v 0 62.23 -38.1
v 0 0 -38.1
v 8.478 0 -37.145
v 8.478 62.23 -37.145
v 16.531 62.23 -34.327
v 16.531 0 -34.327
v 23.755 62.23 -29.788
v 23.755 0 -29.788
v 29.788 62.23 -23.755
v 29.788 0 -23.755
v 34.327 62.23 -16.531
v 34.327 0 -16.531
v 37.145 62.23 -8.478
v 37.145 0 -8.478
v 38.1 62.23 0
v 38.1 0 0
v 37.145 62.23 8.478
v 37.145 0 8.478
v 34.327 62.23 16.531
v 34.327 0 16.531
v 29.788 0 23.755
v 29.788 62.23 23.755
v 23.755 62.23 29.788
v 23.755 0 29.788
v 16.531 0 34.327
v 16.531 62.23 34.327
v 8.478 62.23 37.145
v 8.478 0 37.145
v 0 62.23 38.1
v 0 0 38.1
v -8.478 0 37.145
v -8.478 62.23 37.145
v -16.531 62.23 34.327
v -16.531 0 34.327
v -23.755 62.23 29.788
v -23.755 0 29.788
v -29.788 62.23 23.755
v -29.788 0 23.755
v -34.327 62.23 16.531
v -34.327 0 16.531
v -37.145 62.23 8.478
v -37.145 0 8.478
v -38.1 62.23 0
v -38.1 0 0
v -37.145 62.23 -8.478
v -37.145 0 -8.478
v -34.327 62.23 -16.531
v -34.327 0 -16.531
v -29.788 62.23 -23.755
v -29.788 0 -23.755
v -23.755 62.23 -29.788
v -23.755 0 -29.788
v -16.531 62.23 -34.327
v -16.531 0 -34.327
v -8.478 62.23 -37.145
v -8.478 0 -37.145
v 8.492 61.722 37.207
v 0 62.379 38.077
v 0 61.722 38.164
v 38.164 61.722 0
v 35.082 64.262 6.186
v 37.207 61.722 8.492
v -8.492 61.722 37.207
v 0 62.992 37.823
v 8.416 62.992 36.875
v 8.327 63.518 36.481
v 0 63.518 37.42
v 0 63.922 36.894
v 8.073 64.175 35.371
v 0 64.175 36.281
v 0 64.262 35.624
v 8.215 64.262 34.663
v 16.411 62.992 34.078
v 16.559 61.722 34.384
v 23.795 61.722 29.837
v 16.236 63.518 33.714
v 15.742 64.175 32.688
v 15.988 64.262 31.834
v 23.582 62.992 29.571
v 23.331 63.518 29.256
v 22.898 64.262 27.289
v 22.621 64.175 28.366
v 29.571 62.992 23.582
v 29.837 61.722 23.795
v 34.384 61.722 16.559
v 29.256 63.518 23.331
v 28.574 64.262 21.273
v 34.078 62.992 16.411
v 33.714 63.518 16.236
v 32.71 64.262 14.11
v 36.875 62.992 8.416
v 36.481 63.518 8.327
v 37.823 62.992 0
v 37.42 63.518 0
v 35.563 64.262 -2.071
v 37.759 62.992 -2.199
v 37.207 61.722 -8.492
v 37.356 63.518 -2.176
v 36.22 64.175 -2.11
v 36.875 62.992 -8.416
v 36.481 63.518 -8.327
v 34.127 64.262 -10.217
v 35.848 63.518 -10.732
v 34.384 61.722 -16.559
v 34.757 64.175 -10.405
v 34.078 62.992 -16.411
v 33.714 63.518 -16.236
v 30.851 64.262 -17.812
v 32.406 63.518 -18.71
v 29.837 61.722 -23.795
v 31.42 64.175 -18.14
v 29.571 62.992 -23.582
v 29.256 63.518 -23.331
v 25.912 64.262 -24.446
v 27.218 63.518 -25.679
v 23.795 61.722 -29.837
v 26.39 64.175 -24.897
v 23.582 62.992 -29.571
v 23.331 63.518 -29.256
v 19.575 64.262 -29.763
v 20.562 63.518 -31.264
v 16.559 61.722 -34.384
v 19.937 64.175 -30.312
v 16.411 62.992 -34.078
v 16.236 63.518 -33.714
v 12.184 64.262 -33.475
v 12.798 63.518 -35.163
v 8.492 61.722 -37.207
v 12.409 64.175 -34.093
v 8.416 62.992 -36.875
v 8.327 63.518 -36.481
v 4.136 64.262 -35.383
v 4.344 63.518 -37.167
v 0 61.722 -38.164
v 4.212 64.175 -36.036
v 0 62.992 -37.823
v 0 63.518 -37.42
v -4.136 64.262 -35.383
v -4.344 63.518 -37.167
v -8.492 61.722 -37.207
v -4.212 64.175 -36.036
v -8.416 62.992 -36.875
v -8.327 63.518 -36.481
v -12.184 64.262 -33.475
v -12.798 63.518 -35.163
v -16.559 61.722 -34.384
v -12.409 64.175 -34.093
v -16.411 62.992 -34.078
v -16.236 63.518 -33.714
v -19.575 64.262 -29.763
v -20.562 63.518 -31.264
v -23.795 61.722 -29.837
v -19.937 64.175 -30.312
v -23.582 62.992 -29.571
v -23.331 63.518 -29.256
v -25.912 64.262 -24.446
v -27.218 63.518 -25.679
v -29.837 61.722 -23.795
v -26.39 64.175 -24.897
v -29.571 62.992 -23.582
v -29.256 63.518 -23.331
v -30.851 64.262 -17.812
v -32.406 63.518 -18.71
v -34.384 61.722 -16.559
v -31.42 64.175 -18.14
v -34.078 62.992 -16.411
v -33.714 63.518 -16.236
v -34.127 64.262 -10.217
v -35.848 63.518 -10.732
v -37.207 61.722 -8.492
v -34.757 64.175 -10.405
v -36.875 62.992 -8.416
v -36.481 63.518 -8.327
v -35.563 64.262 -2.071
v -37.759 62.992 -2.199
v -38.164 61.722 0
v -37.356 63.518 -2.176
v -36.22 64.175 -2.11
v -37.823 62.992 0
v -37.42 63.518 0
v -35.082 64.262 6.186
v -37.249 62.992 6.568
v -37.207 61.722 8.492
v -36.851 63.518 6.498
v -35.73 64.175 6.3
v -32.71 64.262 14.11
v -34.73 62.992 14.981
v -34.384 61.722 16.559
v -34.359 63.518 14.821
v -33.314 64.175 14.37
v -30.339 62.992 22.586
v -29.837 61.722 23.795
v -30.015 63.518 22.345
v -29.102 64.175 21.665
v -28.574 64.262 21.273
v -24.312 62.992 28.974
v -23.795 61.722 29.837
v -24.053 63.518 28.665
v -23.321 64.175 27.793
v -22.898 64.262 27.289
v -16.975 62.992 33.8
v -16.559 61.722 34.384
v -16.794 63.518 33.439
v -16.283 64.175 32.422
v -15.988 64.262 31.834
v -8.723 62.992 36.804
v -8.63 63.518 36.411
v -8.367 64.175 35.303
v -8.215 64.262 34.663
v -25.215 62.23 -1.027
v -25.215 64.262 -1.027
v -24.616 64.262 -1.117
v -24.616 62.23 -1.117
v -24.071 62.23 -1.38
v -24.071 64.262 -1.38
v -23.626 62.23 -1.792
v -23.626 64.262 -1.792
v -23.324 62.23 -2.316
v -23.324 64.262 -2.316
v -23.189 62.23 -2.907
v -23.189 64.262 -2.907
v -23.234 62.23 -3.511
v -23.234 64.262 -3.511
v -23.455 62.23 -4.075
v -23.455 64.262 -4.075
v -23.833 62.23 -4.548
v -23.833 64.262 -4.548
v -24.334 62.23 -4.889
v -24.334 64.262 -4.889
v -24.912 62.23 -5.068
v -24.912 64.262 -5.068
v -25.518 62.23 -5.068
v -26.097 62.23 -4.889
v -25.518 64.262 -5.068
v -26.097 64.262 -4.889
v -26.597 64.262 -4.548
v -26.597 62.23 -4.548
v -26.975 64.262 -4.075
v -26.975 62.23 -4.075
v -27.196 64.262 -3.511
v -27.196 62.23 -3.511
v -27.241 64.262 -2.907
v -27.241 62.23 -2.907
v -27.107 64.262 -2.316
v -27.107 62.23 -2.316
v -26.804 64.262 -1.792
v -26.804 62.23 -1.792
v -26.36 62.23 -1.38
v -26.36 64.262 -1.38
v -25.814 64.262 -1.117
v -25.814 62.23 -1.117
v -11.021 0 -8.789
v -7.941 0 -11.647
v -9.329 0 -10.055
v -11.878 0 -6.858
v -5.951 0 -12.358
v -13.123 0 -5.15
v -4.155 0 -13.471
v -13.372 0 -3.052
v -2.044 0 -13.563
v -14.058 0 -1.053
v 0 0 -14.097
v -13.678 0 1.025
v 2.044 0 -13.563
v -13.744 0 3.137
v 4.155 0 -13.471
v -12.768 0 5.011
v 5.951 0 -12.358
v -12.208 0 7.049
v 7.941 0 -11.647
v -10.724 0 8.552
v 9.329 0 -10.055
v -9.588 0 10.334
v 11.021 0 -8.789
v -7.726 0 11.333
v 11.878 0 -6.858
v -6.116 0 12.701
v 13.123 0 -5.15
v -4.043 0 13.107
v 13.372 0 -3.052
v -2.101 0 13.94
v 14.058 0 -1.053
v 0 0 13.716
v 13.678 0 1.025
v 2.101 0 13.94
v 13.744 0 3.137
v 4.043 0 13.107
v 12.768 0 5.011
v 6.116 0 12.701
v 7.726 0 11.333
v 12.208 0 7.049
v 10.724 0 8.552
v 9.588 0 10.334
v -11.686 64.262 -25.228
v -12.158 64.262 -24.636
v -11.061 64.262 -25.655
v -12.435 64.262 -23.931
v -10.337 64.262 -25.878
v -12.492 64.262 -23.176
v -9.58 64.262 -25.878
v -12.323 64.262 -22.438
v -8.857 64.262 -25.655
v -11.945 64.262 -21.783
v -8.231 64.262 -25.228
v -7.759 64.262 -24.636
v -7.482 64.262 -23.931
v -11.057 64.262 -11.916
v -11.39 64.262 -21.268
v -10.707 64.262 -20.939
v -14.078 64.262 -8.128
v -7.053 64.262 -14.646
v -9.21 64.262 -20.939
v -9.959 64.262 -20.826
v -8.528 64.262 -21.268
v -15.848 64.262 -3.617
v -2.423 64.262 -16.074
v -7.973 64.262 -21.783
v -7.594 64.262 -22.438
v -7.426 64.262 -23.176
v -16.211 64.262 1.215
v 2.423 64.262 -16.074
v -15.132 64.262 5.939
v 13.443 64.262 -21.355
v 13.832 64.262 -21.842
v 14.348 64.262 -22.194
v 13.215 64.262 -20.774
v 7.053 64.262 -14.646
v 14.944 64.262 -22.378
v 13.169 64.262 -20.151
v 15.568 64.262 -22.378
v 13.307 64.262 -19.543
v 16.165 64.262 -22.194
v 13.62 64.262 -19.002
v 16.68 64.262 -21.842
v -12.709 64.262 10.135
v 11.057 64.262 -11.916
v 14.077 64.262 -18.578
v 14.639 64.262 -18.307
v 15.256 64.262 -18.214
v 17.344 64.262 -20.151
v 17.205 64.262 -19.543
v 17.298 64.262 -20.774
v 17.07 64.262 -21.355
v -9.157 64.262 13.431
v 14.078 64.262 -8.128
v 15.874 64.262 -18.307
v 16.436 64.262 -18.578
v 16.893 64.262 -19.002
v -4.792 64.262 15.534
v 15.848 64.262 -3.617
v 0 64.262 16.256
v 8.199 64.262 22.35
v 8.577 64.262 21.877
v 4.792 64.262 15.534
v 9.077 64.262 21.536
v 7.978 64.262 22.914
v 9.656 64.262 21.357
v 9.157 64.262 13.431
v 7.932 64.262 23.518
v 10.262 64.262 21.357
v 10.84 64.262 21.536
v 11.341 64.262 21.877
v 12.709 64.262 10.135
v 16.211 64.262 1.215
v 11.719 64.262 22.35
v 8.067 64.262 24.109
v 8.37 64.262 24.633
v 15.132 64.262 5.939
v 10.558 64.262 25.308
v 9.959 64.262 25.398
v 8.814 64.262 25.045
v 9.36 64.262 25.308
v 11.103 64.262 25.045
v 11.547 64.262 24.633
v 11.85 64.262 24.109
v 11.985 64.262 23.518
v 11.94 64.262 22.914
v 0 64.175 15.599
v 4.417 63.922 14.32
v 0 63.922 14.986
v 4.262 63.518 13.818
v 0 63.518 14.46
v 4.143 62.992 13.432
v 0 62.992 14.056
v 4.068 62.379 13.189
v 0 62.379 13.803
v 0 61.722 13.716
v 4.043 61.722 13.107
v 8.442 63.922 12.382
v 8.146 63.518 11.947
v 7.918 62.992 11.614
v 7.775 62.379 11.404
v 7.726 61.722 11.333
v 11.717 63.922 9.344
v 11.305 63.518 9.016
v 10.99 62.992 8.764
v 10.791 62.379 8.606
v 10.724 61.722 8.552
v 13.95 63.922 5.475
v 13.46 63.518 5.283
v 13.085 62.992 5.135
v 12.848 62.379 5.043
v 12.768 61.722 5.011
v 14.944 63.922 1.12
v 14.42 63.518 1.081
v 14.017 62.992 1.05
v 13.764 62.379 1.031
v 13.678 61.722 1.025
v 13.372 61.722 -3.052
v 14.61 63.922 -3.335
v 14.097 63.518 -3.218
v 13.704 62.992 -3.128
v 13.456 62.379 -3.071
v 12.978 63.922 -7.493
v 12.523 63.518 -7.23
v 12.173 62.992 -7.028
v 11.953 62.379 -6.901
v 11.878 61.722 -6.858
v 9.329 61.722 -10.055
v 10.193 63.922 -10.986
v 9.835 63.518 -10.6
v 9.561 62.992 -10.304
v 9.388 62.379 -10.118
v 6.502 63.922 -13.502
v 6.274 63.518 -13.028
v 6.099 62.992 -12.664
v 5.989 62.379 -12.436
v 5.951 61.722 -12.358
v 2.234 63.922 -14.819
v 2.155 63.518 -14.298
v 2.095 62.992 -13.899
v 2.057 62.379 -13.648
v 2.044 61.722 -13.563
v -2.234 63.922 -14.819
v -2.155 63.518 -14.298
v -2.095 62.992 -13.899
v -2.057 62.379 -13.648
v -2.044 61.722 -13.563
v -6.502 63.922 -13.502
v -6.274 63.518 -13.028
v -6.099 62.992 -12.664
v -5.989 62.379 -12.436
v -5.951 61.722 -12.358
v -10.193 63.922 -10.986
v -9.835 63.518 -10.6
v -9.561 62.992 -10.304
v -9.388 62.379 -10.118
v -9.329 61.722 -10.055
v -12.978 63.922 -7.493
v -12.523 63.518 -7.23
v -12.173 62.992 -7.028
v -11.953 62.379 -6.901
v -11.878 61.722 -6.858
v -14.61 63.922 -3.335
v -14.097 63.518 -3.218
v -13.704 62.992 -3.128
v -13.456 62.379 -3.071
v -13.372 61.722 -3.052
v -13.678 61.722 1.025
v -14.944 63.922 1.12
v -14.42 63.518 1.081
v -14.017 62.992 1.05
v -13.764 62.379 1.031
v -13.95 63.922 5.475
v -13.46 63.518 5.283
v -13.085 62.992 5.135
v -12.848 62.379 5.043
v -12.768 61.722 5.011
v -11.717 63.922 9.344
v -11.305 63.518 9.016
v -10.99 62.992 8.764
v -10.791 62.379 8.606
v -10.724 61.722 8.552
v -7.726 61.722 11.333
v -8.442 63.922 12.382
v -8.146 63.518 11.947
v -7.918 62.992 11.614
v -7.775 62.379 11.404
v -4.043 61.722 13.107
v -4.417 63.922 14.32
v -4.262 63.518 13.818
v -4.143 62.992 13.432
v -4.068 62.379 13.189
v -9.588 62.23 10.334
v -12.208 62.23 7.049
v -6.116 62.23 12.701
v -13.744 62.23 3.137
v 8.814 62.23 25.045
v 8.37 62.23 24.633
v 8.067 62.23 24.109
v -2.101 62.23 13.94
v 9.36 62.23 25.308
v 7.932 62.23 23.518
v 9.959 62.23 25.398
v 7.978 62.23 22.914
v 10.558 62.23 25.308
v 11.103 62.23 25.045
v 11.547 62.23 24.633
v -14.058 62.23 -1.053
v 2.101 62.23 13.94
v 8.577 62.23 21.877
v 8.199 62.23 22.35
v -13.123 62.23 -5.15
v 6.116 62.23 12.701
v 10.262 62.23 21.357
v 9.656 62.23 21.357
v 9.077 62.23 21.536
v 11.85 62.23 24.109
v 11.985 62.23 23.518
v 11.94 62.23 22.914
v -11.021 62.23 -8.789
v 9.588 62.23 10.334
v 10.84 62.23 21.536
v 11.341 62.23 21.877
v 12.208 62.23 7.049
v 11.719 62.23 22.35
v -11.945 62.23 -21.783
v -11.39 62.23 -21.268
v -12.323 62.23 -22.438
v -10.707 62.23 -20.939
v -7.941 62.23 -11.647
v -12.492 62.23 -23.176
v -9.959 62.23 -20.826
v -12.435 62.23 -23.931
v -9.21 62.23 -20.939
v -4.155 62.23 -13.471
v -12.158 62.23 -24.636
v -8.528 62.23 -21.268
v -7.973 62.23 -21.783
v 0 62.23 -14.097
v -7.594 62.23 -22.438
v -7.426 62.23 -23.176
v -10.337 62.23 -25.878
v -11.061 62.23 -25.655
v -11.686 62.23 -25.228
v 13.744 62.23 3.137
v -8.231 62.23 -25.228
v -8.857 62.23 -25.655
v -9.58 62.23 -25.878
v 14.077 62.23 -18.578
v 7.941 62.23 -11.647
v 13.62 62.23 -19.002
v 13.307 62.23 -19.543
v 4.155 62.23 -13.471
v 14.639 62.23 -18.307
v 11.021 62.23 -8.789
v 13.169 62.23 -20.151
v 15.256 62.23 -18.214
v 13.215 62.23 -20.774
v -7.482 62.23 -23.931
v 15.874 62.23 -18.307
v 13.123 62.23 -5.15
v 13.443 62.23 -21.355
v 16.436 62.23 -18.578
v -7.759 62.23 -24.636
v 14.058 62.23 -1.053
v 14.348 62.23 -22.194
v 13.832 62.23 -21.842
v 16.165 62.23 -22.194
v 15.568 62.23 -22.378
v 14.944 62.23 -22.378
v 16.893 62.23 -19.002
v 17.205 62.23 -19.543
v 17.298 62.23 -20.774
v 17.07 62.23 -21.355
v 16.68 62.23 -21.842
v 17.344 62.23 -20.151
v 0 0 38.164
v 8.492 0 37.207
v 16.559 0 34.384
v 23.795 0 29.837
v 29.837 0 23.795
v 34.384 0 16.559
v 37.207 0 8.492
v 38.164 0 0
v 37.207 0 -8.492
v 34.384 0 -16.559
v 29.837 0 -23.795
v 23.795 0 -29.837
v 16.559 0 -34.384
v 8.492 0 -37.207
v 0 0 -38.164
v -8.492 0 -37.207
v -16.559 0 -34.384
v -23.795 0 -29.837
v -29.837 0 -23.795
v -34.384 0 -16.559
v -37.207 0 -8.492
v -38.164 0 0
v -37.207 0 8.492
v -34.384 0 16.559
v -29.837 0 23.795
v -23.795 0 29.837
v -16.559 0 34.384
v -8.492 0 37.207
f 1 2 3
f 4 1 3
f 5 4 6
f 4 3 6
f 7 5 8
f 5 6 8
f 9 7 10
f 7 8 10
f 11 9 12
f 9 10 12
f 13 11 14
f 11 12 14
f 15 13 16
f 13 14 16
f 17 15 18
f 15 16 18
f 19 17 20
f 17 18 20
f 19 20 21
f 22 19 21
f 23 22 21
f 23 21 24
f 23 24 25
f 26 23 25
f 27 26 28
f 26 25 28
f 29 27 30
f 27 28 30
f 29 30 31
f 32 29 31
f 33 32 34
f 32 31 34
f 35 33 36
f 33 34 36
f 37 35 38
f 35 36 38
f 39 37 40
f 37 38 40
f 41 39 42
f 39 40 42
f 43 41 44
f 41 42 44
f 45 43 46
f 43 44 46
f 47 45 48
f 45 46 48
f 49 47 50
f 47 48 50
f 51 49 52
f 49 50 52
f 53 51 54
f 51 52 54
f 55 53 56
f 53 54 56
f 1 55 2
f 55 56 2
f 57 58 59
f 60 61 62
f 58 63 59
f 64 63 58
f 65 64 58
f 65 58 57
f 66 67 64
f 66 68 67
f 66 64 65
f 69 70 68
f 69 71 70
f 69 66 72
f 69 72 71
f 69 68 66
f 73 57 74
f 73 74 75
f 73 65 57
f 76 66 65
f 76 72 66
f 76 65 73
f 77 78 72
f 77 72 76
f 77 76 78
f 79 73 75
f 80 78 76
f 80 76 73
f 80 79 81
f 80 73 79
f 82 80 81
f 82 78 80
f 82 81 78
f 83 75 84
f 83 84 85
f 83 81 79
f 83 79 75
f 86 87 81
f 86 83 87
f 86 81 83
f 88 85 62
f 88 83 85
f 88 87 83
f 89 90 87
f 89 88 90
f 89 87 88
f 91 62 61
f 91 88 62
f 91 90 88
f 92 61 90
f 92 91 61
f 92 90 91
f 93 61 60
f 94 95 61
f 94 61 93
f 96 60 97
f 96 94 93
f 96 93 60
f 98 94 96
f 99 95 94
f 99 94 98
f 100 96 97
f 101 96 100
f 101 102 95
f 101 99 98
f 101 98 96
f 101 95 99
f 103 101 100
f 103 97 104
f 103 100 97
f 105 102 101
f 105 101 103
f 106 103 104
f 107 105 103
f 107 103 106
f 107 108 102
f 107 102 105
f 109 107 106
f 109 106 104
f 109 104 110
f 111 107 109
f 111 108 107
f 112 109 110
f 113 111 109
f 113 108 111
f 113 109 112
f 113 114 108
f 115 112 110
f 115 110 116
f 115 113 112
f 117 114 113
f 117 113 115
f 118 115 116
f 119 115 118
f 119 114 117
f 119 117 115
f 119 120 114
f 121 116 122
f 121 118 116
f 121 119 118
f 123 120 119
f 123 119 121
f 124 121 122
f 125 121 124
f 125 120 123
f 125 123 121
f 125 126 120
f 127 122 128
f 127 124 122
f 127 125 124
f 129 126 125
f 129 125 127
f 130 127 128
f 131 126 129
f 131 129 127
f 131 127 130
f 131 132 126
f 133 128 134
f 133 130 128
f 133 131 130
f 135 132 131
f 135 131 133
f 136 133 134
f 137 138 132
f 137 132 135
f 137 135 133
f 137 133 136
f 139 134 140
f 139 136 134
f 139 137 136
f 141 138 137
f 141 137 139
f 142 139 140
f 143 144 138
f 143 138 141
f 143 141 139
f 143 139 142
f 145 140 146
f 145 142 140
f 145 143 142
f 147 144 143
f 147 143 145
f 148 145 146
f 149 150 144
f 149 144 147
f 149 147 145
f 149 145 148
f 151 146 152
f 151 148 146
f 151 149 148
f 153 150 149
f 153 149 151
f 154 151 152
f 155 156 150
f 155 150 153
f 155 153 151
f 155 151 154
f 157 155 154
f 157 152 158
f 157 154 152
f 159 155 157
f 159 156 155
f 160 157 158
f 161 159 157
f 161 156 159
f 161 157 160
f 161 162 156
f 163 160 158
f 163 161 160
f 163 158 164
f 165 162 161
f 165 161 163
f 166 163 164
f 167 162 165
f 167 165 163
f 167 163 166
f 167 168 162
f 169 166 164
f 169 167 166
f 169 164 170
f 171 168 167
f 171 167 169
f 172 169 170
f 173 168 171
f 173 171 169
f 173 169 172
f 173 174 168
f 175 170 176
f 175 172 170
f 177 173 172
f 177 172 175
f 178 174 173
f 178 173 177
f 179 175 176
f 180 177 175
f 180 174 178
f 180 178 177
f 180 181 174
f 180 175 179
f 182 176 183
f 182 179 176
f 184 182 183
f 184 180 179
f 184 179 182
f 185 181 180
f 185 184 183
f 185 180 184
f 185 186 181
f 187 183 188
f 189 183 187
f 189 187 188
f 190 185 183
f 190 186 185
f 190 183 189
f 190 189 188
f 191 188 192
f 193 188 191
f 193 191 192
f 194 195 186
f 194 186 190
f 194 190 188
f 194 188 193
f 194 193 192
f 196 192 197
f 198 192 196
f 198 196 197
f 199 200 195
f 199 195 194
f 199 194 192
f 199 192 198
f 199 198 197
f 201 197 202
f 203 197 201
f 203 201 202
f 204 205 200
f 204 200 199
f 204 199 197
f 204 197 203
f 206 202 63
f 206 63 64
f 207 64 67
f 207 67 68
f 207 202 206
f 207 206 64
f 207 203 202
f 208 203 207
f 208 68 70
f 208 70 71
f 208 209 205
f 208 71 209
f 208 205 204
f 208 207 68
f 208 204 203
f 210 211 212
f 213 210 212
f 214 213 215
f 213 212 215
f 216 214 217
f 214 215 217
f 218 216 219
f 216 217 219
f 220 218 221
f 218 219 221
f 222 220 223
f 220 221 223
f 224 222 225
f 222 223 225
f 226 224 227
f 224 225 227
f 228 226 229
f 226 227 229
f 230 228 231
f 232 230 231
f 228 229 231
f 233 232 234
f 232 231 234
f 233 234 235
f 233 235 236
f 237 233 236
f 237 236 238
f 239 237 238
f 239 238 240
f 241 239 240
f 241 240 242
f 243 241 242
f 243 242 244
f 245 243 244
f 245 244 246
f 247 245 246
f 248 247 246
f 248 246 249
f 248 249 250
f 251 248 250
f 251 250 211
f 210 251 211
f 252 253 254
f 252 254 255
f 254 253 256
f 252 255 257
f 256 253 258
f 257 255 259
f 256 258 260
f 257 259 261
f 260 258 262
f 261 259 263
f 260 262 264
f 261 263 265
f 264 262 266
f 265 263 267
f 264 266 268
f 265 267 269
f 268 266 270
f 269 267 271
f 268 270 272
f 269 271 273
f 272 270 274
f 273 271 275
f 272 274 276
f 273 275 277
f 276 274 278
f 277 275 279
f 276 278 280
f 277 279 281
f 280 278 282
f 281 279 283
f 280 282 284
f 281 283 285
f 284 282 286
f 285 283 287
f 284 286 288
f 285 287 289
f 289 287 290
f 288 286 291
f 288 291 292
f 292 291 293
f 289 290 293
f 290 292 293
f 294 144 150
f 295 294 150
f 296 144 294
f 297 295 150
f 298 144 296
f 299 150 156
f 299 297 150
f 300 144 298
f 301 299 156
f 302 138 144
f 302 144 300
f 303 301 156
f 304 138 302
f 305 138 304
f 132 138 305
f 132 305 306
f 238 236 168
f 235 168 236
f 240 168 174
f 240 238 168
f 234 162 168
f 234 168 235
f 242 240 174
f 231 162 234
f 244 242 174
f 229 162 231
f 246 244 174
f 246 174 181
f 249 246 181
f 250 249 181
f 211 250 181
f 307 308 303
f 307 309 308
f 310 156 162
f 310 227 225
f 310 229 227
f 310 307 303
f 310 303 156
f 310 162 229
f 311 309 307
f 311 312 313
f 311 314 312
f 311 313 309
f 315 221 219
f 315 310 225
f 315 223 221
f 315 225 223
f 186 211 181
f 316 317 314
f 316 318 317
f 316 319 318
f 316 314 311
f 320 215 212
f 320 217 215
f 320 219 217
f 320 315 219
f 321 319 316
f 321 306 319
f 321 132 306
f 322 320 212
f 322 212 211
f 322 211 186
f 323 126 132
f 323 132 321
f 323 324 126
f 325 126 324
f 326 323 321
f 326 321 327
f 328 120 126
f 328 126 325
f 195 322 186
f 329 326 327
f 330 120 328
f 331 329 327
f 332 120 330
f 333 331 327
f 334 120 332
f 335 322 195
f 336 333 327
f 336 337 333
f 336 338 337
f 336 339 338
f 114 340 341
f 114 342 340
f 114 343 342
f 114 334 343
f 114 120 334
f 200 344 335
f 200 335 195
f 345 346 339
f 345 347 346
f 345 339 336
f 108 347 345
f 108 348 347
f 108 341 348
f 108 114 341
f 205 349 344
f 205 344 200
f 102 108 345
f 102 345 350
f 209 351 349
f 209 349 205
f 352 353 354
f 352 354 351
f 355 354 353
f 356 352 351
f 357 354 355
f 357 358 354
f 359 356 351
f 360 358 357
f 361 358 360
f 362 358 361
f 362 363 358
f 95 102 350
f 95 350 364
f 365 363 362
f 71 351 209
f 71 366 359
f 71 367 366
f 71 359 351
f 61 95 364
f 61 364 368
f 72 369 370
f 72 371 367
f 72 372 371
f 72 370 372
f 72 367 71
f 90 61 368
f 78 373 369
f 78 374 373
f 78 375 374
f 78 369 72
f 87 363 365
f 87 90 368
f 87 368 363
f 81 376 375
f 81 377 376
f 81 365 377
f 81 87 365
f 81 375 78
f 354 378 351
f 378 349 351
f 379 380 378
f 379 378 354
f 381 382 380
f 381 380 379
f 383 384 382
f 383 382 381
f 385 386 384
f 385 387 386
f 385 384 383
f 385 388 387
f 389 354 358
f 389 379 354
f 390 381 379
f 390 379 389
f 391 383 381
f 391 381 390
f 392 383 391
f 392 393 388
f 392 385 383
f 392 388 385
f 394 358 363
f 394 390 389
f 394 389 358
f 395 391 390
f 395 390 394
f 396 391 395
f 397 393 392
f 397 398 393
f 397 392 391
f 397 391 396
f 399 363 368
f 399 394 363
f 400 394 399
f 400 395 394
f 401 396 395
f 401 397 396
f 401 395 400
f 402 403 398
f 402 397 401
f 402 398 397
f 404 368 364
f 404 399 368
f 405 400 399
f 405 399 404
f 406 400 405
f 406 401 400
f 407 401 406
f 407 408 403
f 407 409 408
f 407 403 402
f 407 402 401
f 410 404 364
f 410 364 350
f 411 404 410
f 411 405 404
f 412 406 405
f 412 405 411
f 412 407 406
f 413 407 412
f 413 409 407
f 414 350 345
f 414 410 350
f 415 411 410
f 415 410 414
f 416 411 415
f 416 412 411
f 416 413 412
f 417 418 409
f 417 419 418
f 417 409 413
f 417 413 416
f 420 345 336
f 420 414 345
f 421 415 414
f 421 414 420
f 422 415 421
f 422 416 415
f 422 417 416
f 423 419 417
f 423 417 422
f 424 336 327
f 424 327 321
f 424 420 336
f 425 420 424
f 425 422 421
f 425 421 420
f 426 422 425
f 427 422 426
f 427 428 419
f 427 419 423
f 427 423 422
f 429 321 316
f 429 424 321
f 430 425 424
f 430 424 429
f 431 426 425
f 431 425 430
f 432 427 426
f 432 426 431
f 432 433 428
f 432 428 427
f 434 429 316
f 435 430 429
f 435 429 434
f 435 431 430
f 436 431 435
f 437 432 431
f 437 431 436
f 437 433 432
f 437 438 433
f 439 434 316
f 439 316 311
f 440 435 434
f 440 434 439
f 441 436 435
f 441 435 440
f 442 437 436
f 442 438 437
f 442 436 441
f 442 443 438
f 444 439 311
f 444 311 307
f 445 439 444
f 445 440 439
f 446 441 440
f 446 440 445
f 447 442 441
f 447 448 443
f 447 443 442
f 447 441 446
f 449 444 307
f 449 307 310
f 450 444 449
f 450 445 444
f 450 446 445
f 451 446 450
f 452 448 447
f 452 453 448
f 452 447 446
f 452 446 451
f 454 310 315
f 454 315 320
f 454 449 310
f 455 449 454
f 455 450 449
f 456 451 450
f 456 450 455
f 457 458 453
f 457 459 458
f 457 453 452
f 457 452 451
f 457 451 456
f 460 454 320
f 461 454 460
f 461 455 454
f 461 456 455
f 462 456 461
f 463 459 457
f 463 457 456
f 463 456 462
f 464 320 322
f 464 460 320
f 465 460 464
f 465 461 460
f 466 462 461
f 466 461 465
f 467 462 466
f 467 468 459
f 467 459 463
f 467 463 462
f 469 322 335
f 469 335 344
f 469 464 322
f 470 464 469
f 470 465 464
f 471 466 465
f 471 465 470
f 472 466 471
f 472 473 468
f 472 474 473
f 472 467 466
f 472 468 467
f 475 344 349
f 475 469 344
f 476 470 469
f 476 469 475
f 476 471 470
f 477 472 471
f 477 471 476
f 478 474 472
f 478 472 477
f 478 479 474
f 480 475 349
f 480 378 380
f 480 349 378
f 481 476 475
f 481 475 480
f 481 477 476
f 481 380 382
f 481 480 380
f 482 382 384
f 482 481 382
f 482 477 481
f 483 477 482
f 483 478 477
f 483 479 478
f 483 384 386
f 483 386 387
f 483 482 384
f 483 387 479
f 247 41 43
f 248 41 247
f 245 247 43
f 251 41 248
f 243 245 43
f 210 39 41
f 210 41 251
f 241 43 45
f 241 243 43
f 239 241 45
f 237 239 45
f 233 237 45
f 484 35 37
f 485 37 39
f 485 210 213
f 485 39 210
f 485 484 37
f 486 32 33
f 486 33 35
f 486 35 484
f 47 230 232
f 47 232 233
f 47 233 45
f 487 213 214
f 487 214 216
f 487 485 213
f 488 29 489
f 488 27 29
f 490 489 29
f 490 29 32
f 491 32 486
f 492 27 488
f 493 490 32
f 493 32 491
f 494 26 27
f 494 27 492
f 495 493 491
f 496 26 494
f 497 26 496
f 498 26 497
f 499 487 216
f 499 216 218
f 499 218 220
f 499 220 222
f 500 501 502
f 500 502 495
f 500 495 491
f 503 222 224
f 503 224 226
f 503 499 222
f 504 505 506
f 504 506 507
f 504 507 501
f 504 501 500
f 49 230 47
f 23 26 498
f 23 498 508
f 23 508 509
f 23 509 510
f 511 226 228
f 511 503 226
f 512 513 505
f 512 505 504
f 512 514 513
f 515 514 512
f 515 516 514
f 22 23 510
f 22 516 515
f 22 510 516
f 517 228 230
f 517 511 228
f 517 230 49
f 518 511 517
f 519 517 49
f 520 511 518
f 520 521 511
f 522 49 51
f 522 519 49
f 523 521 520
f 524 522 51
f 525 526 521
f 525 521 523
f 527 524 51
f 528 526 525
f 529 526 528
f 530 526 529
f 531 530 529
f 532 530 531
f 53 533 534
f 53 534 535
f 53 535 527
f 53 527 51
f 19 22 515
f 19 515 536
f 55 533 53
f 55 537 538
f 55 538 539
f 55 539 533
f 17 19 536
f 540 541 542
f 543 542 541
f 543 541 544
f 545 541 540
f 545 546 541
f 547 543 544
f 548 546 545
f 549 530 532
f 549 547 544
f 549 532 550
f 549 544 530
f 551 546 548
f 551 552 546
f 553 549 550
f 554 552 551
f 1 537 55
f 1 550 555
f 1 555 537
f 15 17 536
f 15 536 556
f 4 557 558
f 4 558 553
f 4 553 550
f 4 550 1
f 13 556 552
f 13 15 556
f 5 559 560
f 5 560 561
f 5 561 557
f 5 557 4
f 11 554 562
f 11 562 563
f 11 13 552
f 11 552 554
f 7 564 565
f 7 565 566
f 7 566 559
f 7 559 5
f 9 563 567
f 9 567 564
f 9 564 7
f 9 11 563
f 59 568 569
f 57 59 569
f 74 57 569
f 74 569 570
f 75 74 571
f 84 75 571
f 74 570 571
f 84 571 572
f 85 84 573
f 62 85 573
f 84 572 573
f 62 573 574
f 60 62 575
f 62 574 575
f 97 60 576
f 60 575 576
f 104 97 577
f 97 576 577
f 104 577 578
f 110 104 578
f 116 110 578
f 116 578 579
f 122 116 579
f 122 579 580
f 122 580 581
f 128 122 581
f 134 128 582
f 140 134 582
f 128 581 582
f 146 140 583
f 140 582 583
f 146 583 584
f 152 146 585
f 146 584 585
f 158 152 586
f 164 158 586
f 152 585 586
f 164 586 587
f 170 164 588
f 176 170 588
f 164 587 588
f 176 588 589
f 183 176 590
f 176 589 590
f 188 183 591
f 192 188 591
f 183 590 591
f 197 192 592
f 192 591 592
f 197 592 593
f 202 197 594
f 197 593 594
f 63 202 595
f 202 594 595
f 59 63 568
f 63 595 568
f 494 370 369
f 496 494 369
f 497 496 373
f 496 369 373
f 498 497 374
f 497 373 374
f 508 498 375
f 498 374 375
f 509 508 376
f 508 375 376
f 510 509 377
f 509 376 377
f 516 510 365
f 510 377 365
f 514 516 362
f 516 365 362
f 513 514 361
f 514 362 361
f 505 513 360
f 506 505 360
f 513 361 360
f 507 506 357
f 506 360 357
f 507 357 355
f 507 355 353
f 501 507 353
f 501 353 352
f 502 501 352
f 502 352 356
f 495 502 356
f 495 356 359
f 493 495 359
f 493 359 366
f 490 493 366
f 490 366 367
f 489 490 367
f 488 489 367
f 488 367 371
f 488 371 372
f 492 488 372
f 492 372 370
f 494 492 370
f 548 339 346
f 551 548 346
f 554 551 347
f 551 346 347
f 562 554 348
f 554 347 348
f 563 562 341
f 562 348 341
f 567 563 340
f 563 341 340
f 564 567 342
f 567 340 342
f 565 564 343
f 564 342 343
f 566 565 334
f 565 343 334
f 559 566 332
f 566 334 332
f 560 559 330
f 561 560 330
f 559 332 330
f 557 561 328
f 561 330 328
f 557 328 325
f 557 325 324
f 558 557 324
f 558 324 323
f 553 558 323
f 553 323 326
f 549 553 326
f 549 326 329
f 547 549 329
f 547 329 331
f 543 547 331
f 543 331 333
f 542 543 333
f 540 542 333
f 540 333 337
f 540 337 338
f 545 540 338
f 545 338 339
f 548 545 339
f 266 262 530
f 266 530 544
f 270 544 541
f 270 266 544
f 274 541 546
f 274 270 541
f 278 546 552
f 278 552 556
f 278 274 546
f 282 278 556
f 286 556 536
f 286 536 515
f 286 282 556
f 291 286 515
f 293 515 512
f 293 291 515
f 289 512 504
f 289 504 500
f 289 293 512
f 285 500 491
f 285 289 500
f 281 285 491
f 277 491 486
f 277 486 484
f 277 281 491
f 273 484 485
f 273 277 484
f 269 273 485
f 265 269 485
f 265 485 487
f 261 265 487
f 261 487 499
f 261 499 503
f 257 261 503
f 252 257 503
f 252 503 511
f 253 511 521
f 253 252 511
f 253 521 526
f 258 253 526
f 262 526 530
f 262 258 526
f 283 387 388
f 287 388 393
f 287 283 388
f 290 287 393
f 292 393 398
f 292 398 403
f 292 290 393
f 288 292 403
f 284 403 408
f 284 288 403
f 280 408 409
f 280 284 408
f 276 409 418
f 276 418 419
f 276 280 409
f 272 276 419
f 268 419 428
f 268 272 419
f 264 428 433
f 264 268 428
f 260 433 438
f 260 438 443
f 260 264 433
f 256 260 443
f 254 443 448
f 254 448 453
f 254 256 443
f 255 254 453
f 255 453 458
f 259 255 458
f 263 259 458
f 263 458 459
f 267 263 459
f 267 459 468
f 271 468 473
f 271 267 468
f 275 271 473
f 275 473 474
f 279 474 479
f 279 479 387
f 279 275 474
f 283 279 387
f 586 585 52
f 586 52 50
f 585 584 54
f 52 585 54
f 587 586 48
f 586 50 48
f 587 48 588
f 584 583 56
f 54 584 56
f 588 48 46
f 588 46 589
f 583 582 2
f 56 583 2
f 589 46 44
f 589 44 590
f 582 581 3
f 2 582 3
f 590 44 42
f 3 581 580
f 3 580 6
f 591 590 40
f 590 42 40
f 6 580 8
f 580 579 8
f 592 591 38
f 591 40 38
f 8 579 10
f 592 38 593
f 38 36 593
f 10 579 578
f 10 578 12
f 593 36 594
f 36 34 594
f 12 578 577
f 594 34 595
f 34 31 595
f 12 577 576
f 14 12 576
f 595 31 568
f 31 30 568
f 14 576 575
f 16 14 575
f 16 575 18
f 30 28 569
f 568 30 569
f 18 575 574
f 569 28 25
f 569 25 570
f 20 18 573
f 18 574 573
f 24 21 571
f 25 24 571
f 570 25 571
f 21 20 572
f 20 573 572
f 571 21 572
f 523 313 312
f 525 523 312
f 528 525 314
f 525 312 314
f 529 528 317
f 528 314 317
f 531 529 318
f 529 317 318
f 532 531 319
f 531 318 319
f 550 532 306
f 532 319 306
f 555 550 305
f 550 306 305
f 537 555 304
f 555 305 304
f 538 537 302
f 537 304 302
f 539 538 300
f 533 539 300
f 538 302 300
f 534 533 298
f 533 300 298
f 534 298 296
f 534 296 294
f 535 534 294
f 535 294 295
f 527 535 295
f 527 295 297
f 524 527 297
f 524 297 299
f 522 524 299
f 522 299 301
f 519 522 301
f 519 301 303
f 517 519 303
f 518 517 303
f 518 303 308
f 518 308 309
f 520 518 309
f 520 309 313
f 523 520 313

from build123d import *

# Parameters (mm, degrees)
SKETCH1_R           = 38.1635
SKETCH1_R_2         = 13.716
BOSS_EXTRUDE3_DEPTH = 64.262
SKETCH3_R           = 38.1
SKETCH3_R_2         = 14.097
CUT_EXTRUDE1_DEPTH  = 62.23
FILLET1_R           = 2.54
SKETCH5_R           = 2.093695025
SKETCH5_R_2         = 2.032
SKETCH5_R_3         = 2.54
CUT_EXTRUDE2_DEPTH  = 2.54


with BuildPart() as part:
    # Sketch1 → Boss-Extrude3 (new body)
    with BuildSketch(Plane(origin=(0, 0, 0), x_dir=(1, 0, 0), z_dir=(0, 1, 0))):
        with Locations(Location((0, 0, 0), (0, 0, 270))):
            Circle(SKETCH1_R)
        with Locations(Location((0, 0, 0), (0, 0, 270))):
            Circle(SKETCH1_R_2, mode=Mode.SUBTRACT)
    extrude(amount=BOSS_EXTRUDE3_DEPTH)

    # Sketch3 → Cut-Extrude1 (cut)
    with BuildSketch(Plane(origin=(0, 0, 0), x_dir=(-1, 0, 0), z_dir=(0, -1, 0))):
        with Locations(Location((0, 0, 0), (0, 0, 90))):
            Circle(SKETCH3_R)
        with Locations(Location((0, 0, 0), (0, 0, 90))):
            Circle(SKETCH3_R_2, mode=Mode.SUBTRACT)
    extrude(amount=-CUT_EXTRUDE1_DEPTH, mode=Mode.SUBTRACT)

    # Fillet1
    fillet1_edges = [part.edges().sort_by_distance(p)[0] for p in [
        (0, 64.262, -38.1635),
        (0, 64.262, -13.716),
    ]]
    fillet(fillet1_edges, radius=FILLET1_R)

    # Sketch5 → Cut-Extrude2 (cut)
    with BuildSketch(Plane(origin=(0, 64.262, 0), x_dir=(1, 0, 0), z_dir=(0, 1, 0))):
        with Locations(Location((15.256423447, 20.307672038, 0), (0, 0, 270))):
            Circle(SKETCH5_R)
        with Locations(Location((-25.2151716, 3.058614257, 0), (0, 0, 270))):
            Circle(SKETCH5_R_2)
        with Locations(Location((9.958748153, -23.366286295, 0), (0, 0, 270))):
            Circle(SKETCH5_R_2)
        with Locations(Location((-9.958748153, 23.366286295, 0), (0, 0, 270))):
            Circle(SKETCH5_R_3)
    extrude(amount=-CUT_EXTRUDE2_DEPTH, mode=Mode.SUBTRACT)


solid = part.part
